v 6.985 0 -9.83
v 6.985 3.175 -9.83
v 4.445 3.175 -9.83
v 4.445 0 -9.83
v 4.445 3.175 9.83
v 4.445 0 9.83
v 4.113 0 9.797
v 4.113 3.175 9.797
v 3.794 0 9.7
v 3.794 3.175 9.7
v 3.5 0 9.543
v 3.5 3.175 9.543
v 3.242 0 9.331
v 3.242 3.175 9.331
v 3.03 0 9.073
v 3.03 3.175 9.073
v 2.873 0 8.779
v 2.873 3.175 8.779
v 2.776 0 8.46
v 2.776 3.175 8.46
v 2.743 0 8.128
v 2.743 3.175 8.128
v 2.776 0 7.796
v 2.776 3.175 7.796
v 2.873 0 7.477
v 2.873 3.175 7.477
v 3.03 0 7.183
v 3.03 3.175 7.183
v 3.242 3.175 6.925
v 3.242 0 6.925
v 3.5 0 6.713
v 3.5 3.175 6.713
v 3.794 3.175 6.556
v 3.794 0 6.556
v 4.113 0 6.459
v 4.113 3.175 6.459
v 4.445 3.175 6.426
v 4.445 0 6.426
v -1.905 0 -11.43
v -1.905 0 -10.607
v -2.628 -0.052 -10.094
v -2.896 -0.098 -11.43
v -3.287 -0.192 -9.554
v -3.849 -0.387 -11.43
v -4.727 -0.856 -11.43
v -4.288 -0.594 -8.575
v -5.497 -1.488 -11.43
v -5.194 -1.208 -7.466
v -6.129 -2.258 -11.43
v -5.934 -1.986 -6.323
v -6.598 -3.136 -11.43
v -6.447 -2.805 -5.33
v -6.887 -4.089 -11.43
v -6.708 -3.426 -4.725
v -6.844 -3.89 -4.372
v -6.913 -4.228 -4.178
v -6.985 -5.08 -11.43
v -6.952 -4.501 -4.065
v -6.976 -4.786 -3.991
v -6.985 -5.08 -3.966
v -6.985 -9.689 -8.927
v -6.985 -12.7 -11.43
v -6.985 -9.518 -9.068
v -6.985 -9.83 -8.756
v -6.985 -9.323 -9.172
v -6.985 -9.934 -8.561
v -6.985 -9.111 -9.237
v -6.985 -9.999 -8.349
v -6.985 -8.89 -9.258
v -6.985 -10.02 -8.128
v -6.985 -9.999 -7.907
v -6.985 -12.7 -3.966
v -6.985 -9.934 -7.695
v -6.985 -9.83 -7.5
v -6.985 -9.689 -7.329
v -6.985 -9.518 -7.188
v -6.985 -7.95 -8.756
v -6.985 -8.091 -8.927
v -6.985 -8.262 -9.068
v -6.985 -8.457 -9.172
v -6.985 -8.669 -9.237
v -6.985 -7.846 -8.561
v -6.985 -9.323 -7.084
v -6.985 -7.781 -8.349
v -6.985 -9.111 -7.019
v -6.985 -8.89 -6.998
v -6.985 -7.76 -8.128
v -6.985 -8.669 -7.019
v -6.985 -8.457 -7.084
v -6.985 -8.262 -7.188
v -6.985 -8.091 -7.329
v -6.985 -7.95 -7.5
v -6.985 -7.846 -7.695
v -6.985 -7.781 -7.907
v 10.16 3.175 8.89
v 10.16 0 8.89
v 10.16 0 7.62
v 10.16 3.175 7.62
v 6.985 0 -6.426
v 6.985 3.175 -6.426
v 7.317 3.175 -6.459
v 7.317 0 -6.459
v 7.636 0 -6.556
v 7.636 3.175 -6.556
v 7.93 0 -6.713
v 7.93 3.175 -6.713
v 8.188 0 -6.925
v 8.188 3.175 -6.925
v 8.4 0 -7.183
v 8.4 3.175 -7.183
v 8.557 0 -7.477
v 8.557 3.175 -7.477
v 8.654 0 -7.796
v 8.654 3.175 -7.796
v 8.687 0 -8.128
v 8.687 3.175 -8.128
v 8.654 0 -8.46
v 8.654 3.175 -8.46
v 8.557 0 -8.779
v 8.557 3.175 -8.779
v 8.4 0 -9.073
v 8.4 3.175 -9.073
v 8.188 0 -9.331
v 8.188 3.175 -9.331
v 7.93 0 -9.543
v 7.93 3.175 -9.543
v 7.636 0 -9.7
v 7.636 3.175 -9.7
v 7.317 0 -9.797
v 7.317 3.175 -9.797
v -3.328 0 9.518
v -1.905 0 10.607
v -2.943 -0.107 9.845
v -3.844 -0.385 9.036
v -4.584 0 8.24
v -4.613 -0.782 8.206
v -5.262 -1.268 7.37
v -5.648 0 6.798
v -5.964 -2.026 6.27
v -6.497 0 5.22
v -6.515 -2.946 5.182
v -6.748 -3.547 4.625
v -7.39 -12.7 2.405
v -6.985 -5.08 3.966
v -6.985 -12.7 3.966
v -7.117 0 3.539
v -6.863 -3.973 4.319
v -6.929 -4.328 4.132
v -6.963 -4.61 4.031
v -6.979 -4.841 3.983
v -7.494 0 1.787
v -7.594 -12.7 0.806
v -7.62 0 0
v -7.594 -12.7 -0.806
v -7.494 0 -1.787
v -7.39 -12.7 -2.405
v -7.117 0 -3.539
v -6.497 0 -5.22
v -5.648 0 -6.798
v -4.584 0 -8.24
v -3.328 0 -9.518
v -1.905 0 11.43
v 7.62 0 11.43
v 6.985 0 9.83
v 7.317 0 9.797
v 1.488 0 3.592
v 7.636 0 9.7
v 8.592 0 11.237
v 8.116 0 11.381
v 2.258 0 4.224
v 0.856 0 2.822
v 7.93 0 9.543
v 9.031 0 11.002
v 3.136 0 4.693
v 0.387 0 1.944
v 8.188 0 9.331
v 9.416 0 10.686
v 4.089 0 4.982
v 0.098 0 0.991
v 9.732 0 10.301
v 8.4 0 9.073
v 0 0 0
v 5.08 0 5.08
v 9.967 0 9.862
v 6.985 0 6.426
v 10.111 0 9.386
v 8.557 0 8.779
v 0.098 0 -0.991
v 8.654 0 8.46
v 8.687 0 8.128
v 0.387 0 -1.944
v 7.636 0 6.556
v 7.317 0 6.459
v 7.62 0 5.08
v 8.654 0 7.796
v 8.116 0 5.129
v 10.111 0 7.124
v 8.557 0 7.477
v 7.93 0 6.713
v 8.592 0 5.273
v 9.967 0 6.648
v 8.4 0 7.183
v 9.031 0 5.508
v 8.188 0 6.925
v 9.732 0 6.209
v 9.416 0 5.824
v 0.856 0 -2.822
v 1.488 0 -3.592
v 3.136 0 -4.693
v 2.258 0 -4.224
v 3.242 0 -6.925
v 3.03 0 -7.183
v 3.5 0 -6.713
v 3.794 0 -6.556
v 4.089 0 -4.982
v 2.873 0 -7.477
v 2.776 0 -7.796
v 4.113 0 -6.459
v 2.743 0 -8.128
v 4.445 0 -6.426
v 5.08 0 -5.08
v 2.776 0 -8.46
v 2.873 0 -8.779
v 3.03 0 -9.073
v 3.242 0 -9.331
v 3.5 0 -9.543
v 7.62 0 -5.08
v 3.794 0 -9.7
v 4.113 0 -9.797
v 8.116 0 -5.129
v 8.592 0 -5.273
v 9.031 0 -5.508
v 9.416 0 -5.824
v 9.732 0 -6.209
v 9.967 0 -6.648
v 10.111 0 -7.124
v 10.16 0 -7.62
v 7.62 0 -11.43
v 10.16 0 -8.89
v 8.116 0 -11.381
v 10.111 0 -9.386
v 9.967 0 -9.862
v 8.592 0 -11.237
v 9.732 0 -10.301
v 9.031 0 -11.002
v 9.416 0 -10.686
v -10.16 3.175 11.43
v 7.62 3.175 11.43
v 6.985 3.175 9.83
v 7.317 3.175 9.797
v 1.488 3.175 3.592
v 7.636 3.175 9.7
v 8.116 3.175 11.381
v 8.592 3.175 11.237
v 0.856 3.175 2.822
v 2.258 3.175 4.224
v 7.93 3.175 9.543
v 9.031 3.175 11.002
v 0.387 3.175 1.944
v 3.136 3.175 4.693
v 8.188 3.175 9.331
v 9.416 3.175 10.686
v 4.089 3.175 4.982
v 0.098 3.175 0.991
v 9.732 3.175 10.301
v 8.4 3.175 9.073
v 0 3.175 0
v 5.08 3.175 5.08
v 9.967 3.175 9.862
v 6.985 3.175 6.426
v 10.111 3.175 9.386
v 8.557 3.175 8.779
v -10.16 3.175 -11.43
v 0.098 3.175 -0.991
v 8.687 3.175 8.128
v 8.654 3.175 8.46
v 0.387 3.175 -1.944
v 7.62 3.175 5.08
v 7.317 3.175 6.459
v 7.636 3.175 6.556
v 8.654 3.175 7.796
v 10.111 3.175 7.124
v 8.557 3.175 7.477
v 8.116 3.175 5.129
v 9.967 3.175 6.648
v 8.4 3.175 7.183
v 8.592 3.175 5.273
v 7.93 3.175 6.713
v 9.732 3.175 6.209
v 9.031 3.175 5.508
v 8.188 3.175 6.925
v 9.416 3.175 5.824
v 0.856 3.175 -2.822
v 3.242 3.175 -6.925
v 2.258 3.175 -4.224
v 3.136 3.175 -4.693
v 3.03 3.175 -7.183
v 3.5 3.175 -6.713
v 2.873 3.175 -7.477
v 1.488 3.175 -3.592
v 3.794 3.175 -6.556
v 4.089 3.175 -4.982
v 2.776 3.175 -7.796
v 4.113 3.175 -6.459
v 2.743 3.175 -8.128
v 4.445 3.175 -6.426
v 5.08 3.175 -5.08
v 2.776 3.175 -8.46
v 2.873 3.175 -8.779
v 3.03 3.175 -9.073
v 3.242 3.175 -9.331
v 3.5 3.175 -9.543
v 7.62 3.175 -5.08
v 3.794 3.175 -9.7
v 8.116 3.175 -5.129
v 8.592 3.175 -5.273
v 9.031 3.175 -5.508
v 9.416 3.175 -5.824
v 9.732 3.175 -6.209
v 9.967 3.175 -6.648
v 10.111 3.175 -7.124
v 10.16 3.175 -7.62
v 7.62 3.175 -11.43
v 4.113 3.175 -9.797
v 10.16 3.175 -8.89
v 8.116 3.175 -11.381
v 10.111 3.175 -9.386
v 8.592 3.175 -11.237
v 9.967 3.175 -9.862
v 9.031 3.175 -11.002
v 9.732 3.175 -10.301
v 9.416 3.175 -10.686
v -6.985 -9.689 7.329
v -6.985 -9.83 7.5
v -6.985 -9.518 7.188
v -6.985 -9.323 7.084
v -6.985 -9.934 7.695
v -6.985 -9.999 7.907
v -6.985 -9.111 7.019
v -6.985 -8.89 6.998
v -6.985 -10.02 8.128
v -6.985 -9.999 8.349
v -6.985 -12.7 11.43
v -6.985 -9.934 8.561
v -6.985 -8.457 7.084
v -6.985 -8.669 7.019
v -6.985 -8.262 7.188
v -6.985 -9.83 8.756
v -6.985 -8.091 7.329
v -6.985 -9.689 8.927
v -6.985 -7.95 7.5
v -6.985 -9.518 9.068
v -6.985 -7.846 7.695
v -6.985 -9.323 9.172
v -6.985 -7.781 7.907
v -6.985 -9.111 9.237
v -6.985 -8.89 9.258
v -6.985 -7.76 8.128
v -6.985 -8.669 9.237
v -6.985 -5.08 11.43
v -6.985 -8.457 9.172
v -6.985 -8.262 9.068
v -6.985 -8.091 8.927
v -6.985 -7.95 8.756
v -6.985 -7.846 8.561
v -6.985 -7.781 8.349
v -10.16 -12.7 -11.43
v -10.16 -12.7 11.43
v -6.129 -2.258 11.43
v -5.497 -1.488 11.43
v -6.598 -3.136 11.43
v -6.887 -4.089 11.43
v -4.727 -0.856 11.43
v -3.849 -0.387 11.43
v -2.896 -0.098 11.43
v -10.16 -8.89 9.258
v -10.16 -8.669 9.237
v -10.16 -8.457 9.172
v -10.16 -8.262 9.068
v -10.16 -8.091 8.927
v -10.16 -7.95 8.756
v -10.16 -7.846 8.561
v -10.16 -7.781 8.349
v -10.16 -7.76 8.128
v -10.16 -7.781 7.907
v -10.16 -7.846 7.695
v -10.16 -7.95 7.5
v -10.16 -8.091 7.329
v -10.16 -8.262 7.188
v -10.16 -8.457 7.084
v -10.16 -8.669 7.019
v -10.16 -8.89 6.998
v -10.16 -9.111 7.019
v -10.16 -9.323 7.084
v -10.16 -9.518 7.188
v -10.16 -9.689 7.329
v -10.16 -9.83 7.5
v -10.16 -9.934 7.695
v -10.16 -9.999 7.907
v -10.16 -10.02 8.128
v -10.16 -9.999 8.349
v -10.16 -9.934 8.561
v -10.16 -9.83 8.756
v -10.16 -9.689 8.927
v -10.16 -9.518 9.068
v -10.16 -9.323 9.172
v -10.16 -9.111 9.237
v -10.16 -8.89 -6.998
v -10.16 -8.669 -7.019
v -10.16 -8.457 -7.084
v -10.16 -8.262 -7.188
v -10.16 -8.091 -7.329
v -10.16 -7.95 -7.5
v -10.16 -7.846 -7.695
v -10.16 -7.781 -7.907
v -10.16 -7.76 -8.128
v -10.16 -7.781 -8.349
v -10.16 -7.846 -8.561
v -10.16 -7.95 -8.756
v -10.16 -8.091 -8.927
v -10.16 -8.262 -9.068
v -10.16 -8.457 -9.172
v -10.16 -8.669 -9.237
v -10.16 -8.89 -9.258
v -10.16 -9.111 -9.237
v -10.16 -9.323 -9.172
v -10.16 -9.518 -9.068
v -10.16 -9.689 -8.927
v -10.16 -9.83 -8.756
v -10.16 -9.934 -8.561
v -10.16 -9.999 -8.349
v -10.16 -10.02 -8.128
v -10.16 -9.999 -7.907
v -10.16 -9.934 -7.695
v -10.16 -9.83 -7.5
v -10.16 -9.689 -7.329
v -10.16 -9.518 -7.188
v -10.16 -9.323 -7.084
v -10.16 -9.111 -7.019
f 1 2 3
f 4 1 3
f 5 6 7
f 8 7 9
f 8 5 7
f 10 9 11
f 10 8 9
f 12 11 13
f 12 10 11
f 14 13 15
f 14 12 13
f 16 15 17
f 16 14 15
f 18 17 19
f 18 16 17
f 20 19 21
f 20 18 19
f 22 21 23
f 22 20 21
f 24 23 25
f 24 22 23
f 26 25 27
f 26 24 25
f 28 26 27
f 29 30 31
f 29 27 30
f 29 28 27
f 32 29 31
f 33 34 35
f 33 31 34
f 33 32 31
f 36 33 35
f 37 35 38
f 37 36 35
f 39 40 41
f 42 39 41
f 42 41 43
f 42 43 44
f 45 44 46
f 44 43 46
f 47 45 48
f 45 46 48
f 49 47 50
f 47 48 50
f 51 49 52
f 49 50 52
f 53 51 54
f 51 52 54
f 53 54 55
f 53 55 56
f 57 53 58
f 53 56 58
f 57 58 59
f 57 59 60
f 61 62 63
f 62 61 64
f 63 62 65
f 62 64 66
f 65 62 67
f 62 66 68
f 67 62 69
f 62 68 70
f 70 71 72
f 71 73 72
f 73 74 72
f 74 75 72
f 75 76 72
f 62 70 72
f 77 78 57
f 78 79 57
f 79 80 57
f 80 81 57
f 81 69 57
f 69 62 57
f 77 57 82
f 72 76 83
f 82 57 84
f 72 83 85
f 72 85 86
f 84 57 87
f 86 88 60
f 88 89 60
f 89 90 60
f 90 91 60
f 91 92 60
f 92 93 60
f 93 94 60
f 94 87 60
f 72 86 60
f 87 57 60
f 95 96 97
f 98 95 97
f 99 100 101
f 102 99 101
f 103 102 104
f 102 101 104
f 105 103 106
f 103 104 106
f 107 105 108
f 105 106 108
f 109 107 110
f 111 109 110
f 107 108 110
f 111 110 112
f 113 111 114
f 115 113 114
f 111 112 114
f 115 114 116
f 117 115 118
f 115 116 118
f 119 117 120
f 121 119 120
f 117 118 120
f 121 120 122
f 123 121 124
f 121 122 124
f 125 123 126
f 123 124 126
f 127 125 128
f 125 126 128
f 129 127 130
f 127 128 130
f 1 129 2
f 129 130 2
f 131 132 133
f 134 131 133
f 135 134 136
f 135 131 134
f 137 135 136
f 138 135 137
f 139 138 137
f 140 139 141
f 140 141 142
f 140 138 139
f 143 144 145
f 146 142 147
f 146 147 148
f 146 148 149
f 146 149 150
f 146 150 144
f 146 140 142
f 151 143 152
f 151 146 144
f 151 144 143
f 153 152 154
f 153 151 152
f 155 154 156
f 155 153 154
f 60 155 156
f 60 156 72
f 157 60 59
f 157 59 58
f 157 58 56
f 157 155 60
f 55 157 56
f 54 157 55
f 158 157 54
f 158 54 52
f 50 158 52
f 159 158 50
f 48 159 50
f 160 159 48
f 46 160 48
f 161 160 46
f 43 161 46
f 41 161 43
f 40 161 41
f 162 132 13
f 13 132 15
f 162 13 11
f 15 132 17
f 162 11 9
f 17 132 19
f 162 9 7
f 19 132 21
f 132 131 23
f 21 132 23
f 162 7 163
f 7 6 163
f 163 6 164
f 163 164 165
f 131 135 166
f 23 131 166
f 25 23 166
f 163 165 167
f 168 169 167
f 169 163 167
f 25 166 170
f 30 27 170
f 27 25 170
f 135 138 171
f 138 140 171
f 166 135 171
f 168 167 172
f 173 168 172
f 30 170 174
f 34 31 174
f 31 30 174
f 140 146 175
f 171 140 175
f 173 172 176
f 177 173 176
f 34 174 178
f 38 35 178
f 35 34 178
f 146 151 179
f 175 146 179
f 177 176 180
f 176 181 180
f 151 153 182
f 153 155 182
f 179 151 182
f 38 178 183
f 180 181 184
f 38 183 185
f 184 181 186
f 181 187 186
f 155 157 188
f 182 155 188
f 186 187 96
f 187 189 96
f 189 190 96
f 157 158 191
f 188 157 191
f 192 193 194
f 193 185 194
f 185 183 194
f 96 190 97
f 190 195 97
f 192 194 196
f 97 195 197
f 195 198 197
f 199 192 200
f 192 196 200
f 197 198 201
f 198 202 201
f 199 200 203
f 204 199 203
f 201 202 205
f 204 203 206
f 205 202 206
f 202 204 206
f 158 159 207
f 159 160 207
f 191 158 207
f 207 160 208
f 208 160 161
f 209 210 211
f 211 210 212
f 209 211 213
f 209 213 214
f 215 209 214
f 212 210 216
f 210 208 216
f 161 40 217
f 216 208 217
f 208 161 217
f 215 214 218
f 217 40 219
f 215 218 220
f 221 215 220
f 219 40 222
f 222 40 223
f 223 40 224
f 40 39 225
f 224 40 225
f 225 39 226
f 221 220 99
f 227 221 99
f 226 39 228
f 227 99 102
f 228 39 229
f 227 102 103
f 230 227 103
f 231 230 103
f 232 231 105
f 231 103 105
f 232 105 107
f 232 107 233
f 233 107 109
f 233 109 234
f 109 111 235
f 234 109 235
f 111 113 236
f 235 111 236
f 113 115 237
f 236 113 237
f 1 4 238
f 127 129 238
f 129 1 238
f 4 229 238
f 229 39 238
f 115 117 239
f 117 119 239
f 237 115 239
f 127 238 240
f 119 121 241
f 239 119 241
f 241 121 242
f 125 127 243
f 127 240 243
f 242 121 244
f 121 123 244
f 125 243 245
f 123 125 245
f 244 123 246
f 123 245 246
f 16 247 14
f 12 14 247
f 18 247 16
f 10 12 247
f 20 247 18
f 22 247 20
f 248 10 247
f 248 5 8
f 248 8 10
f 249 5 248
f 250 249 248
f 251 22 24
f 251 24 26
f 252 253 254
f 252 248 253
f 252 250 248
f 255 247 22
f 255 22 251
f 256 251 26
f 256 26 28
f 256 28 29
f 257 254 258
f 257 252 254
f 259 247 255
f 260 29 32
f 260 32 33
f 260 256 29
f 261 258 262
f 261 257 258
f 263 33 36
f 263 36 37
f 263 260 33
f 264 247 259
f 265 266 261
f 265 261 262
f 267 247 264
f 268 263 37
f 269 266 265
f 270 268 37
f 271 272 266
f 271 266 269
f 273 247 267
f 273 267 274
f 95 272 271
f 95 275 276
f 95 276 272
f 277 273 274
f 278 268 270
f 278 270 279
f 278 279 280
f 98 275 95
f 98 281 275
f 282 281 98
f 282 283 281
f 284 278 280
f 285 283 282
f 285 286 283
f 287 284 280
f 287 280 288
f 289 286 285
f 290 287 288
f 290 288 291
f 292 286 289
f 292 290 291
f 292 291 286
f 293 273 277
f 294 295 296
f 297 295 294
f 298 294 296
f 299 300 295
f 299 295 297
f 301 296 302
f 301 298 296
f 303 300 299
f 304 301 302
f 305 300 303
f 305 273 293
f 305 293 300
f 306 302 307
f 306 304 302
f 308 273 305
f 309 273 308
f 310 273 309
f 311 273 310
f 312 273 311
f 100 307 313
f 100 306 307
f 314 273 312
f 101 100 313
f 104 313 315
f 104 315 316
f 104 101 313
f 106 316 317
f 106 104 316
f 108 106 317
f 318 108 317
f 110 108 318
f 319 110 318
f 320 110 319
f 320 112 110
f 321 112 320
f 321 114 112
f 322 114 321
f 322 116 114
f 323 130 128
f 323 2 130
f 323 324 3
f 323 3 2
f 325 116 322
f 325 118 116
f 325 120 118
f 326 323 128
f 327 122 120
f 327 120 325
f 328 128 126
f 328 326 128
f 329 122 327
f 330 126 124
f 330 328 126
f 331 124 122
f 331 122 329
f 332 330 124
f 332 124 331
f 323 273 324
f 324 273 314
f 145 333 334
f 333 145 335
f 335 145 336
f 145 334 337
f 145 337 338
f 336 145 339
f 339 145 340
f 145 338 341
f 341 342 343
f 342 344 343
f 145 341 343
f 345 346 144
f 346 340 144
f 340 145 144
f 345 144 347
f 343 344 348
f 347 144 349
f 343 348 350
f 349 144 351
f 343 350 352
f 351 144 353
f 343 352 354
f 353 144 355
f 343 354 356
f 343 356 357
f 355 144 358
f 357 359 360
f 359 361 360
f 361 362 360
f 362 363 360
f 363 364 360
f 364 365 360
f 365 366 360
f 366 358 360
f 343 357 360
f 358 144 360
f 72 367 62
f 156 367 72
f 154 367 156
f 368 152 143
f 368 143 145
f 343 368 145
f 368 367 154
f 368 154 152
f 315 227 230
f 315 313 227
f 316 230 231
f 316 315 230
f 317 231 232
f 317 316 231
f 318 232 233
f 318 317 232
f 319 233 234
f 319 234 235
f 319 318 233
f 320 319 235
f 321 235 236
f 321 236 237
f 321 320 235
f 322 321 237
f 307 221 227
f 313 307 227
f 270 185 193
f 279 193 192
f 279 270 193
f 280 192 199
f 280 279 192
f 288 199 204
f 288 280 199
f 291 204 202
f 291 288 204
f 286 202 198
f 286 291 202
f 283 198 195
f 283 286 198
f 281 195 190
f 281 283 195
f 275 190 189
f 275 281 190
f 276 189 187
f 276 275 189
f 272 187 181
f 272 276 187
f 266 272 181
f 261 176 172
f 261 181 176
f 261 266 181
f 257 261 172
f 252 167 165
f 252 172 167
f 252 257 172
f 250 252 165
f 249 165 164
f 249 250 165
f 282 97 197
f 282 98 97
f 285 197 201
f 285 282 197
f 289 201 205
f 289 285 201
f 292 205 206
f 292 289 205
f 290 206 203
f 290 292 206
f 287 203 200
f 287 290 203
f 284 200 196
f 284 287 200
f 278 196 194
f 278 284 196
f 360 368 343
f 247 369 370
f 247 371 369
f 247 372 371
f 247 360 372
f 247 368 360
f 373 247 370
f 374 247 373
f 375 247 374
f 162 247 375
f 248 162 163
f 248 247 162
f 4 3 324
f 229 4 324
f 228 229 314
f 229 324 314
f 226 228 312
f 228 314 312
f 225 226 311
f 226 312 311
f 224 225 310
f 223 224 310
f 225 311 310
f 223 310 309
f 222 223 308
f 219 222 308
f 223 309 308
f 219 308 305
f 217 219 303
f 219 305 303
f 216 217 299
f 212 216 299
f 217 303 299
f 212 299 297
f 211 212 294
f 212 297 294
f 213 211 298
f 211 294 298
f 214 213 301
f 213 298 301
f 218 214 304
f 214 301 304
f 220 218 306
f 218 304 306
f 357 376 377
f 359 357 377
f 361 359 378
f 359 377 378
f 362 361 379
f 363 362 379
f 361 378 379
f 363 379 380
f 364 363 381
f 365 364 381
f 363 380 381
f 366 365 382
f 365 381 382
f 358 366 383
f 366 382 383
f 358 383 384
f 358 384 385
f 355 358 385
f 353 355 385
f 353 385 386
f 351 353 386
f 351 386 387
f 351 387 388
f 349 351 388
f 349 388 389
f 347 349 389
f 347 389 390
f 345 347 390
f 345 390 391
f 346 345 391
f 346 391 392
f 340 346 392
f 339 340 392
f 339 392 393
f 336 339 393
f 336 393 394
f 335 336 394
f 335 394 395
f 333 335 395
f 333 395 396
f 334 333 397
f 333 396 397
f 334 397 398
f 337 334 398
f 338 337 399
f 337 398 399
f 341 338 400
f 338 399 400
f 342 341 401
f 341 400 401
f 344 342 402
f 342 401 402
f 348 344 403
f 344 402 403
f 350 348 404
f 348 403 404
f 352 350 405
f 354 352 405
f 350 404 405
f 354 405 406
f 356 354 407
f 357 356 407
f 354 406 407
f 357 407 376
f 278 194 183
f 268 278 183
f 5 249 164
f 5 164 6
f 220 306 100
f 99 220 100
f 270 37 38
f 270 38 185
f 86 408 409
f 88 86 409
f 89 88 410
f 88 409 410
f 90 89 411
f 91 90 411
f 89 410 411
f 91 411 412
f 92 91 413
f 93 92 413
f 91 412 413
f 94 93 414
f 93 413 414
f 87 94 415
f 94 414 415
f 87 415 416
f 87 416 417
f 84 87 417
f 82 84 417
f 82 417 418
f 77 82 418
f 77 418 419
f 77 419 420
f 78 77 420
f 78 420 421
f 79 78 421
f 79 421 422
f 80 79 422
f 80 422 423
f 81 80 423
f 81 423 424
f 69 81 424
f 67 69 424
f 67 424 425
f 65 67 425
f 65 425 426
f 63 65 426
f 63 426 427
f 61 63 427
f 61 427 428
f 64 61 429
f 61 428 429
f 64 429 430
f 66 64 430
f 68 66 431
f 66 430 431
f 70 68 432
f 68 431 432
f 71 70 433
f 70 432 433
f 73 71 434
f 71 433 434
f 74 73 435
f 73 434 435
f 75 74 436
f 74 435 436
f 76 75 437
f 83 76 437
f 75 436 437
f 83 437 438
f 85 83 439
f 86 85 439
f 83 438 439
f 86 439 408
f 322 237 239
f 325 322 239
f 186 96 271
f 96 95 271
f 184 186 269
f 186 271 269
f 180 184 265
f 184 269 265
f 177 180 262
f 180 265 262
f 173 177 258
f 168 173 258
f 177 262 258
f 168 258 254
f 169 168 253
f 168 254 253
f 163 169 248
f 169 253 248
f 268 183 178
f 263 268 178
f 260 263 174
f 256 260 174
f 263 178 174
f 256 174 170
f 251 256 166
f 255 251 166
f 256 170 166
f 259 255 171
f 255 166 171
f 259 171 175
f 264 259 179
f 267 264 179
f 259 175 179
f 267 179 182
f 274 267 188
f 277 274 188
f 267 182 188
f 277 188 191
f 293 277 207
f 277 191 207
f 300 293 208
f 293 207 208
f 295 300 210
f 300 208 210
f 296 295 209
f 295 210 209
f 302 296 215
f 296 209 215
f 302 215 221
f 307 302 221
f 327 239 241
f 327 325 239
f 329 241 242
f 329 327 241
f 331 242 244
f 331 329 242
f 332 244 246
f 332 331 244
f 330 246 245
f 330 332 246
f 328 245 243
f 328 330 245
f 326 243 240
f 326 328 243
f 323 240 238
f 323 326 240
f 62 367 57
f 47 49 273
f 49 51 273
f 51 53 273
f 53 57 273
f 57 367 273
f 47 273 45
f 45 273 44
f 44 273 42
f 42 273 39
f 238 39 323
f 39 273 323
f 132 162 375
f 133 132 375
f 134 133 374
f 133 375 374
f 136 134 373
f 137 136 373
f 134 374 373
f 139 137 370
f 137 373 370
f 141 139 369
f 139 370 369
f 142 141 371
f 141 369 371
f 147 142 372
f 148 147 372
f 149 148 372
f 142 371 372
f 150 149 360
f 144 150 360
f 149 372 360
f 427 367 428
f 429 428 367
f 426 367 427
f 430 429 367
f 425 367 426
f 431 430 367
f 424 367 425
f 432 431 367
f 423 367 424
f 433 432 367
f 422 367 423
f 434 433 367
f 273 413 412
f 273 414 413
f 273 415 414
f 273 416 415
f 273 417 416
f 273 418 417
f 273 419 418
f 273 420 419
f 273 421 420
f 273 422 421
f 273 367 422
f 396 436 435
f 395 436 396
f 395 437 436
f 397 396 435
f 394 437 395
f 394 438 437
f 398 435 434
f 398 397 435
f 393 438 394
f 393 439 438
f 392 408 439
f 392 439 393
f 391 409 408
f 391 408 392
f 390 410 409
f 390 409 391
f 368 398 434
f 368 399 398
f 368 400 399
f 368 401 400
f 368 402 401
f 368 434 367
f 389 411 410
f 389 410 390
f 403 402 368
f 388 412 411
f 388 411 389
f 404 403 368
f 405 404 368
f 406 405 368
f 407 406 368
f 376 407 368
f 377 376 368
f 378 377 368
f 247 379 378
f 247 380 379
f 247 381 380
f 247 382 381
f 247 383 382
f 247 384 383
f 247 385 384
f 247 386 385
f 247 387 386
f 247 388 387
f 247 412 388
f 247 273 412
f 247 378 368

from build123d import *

# Parameters (mm, degrees)
SKETCH1_W             = 20.32
SKETCH1_H             = 22.86
BOSS_EXTRUDE1_DEPTH   = 3.175
FILLET1_R             = 2.54
FILLET2_R             = 2.54
CUT_EXTRUDE2_DEPTH    = 4.175
FILLET3_R             = 2.54
FILLET4_R             = 2.54
SKETCH4_W             = 3.175
SKETCH4_H             = 22.86
BOSS_EXTRUDE2_DEPTH   = 12.7
FILLET6_R             = 5.08
SKETCH5_R             = 12.7
CUT_EXTRUDE4_DEPTH    = 13.7
F_4_40_TAPPED_HOLE3_D = 2.2606
CUT_EXTRUDE6_DEPTH    = 16.8750001


with BuildPart() as part:
    # Sketch1 → Boss-Extrude1 (new body)
    with BuildSketch(Plane(origin=(0, 0, 0), x_dir=(1, 0, 0), z_dir=(0, 1, 0))):
        Rectangle(SKETCH1_W, SKETCH1_H)
    extrude(amount=BOSS_EXTRUDE1_DEPTH)

    # Fillet1
    fillet1_edges = [part.edges().sort_by_distance(p)[0] for p in [
        (10.16, 1.5875, -11.43),
    ]]
    fillet(fillet1_edges, radius=FILLET1_R)

    # Fillet2
    fillet2_edges = [part.edges().sort_by_distance(p)[0] for p in [
        (10.16, 1.5875, 11.43),
    ]]
    fillet(fillet2_edges, radius=FILLET2_R)

    # Sketch2 → Cut-Extrude2 (cut, through all)
    with BuildSketch(Plane.XZ):
        with BuildLine():
            Line((5.08, -5.08), (10.16, -5.08))
            Line((10.16, -5.08), (10.16, 5.08))
            Line((10.16, 5.08), (5.08, 5.08))
            ThreePointArc((5.08, 5.08), (0, 0), (5.08, -5.08))
        make_face()
    extrude(amount=-CUT_EXTRUDE2_DEPTH, mode=Mode.SUBTRACT)

    # Fillet3
    fillet3_edges = [part.edges().sort_by_distance(p)[0] for p in [
        (10.16, 1.5875, 5.08),
    ]]
    fillet(fillet3_edges, radius=FILLET3_R)

    # Fillet4
    fillet4_edges = [part.edges().sort_by_distance(p)[0] for p in [
        (10.16, 1.5875, -5.08),
    ]]
    fillet(fillet4_edges, radius=FILLET4_R)

    # Sketch4 → Boss-Extrude2 (add)
    with BuildSketch(Plane.XZ):
        with Locations((-8.5725, 0)):
            Rectangle(SKETCH4_W, SKETCH4_H)
    extrude(amount=BOSS_EXTRUDE2_DEPTH)

    # Fillet6
    fillet6_edges = [part.edges().sort_by_distance(p)[0] for p in [
        (-6.985, 0, 0),
    ]]
    fillet(fillet6_edges, radius=FILLET6_R)

    # Sketch5 → Cut-Extrude4 (cut, through all)
    with BuildSketch(Plane.XZ):
        with Locations((5.08, 0)):
            Circle(SKETCH5_R)
    extrude(amount=CUT_EXTRUDE4_DEPTH, mode=Mode.SUBTRACT)

    # #4-40 Tapped Hole3 (through all)
    with Locations(Plane(origin=(-6.985, 0, 0), x_dir=(0, 0, -1), z_dir=(1, 0, 0))):
        with Locations((-8.128, -8.89), (8.128, -8.89)):
            Hole(F_4_40_TAPPED_HOLE3_D / 2)

    # Sketch11 → Cut-Extrude6 (cut, through all)
    with BuildSketch(Plane(origin=(0, 3.175, 0), x_dir=(1, 0, 0), z_dir=(0, 1, 0))):
        with BuildLine():
            Line((6.985, 9.8298), (4.445, 9.8298))
            ThreePointArc((4.445, 9.8298), (2.7432, 8.128), (4.445, 6.4262))
            Line((4.445, 6.4262), (6.985, 6.4262))
            ThreePointArc((6.985, 6.4262), (8.6868, 8.128), (6.985, 9.8298))
        make_face()
        with BuildLine():
            Line((4.445, -6.4262), (6.985, -6.4262))
            ThreePointArc((6.985, -6.4262), (8.6868, -8.128), (6.985, -9.8298))
            Line((6.985, -9.8298), (4.445, -9.8298))
            ThreePointArc((4.445, -9.8298), (2.7432, -8.128), (4.445, -6.4262))
        make_face()
    extrude(amount=-CUT_EXTRUDE6_DEPTH, mode=Mode.SUBTRACT)


solid = part.part
